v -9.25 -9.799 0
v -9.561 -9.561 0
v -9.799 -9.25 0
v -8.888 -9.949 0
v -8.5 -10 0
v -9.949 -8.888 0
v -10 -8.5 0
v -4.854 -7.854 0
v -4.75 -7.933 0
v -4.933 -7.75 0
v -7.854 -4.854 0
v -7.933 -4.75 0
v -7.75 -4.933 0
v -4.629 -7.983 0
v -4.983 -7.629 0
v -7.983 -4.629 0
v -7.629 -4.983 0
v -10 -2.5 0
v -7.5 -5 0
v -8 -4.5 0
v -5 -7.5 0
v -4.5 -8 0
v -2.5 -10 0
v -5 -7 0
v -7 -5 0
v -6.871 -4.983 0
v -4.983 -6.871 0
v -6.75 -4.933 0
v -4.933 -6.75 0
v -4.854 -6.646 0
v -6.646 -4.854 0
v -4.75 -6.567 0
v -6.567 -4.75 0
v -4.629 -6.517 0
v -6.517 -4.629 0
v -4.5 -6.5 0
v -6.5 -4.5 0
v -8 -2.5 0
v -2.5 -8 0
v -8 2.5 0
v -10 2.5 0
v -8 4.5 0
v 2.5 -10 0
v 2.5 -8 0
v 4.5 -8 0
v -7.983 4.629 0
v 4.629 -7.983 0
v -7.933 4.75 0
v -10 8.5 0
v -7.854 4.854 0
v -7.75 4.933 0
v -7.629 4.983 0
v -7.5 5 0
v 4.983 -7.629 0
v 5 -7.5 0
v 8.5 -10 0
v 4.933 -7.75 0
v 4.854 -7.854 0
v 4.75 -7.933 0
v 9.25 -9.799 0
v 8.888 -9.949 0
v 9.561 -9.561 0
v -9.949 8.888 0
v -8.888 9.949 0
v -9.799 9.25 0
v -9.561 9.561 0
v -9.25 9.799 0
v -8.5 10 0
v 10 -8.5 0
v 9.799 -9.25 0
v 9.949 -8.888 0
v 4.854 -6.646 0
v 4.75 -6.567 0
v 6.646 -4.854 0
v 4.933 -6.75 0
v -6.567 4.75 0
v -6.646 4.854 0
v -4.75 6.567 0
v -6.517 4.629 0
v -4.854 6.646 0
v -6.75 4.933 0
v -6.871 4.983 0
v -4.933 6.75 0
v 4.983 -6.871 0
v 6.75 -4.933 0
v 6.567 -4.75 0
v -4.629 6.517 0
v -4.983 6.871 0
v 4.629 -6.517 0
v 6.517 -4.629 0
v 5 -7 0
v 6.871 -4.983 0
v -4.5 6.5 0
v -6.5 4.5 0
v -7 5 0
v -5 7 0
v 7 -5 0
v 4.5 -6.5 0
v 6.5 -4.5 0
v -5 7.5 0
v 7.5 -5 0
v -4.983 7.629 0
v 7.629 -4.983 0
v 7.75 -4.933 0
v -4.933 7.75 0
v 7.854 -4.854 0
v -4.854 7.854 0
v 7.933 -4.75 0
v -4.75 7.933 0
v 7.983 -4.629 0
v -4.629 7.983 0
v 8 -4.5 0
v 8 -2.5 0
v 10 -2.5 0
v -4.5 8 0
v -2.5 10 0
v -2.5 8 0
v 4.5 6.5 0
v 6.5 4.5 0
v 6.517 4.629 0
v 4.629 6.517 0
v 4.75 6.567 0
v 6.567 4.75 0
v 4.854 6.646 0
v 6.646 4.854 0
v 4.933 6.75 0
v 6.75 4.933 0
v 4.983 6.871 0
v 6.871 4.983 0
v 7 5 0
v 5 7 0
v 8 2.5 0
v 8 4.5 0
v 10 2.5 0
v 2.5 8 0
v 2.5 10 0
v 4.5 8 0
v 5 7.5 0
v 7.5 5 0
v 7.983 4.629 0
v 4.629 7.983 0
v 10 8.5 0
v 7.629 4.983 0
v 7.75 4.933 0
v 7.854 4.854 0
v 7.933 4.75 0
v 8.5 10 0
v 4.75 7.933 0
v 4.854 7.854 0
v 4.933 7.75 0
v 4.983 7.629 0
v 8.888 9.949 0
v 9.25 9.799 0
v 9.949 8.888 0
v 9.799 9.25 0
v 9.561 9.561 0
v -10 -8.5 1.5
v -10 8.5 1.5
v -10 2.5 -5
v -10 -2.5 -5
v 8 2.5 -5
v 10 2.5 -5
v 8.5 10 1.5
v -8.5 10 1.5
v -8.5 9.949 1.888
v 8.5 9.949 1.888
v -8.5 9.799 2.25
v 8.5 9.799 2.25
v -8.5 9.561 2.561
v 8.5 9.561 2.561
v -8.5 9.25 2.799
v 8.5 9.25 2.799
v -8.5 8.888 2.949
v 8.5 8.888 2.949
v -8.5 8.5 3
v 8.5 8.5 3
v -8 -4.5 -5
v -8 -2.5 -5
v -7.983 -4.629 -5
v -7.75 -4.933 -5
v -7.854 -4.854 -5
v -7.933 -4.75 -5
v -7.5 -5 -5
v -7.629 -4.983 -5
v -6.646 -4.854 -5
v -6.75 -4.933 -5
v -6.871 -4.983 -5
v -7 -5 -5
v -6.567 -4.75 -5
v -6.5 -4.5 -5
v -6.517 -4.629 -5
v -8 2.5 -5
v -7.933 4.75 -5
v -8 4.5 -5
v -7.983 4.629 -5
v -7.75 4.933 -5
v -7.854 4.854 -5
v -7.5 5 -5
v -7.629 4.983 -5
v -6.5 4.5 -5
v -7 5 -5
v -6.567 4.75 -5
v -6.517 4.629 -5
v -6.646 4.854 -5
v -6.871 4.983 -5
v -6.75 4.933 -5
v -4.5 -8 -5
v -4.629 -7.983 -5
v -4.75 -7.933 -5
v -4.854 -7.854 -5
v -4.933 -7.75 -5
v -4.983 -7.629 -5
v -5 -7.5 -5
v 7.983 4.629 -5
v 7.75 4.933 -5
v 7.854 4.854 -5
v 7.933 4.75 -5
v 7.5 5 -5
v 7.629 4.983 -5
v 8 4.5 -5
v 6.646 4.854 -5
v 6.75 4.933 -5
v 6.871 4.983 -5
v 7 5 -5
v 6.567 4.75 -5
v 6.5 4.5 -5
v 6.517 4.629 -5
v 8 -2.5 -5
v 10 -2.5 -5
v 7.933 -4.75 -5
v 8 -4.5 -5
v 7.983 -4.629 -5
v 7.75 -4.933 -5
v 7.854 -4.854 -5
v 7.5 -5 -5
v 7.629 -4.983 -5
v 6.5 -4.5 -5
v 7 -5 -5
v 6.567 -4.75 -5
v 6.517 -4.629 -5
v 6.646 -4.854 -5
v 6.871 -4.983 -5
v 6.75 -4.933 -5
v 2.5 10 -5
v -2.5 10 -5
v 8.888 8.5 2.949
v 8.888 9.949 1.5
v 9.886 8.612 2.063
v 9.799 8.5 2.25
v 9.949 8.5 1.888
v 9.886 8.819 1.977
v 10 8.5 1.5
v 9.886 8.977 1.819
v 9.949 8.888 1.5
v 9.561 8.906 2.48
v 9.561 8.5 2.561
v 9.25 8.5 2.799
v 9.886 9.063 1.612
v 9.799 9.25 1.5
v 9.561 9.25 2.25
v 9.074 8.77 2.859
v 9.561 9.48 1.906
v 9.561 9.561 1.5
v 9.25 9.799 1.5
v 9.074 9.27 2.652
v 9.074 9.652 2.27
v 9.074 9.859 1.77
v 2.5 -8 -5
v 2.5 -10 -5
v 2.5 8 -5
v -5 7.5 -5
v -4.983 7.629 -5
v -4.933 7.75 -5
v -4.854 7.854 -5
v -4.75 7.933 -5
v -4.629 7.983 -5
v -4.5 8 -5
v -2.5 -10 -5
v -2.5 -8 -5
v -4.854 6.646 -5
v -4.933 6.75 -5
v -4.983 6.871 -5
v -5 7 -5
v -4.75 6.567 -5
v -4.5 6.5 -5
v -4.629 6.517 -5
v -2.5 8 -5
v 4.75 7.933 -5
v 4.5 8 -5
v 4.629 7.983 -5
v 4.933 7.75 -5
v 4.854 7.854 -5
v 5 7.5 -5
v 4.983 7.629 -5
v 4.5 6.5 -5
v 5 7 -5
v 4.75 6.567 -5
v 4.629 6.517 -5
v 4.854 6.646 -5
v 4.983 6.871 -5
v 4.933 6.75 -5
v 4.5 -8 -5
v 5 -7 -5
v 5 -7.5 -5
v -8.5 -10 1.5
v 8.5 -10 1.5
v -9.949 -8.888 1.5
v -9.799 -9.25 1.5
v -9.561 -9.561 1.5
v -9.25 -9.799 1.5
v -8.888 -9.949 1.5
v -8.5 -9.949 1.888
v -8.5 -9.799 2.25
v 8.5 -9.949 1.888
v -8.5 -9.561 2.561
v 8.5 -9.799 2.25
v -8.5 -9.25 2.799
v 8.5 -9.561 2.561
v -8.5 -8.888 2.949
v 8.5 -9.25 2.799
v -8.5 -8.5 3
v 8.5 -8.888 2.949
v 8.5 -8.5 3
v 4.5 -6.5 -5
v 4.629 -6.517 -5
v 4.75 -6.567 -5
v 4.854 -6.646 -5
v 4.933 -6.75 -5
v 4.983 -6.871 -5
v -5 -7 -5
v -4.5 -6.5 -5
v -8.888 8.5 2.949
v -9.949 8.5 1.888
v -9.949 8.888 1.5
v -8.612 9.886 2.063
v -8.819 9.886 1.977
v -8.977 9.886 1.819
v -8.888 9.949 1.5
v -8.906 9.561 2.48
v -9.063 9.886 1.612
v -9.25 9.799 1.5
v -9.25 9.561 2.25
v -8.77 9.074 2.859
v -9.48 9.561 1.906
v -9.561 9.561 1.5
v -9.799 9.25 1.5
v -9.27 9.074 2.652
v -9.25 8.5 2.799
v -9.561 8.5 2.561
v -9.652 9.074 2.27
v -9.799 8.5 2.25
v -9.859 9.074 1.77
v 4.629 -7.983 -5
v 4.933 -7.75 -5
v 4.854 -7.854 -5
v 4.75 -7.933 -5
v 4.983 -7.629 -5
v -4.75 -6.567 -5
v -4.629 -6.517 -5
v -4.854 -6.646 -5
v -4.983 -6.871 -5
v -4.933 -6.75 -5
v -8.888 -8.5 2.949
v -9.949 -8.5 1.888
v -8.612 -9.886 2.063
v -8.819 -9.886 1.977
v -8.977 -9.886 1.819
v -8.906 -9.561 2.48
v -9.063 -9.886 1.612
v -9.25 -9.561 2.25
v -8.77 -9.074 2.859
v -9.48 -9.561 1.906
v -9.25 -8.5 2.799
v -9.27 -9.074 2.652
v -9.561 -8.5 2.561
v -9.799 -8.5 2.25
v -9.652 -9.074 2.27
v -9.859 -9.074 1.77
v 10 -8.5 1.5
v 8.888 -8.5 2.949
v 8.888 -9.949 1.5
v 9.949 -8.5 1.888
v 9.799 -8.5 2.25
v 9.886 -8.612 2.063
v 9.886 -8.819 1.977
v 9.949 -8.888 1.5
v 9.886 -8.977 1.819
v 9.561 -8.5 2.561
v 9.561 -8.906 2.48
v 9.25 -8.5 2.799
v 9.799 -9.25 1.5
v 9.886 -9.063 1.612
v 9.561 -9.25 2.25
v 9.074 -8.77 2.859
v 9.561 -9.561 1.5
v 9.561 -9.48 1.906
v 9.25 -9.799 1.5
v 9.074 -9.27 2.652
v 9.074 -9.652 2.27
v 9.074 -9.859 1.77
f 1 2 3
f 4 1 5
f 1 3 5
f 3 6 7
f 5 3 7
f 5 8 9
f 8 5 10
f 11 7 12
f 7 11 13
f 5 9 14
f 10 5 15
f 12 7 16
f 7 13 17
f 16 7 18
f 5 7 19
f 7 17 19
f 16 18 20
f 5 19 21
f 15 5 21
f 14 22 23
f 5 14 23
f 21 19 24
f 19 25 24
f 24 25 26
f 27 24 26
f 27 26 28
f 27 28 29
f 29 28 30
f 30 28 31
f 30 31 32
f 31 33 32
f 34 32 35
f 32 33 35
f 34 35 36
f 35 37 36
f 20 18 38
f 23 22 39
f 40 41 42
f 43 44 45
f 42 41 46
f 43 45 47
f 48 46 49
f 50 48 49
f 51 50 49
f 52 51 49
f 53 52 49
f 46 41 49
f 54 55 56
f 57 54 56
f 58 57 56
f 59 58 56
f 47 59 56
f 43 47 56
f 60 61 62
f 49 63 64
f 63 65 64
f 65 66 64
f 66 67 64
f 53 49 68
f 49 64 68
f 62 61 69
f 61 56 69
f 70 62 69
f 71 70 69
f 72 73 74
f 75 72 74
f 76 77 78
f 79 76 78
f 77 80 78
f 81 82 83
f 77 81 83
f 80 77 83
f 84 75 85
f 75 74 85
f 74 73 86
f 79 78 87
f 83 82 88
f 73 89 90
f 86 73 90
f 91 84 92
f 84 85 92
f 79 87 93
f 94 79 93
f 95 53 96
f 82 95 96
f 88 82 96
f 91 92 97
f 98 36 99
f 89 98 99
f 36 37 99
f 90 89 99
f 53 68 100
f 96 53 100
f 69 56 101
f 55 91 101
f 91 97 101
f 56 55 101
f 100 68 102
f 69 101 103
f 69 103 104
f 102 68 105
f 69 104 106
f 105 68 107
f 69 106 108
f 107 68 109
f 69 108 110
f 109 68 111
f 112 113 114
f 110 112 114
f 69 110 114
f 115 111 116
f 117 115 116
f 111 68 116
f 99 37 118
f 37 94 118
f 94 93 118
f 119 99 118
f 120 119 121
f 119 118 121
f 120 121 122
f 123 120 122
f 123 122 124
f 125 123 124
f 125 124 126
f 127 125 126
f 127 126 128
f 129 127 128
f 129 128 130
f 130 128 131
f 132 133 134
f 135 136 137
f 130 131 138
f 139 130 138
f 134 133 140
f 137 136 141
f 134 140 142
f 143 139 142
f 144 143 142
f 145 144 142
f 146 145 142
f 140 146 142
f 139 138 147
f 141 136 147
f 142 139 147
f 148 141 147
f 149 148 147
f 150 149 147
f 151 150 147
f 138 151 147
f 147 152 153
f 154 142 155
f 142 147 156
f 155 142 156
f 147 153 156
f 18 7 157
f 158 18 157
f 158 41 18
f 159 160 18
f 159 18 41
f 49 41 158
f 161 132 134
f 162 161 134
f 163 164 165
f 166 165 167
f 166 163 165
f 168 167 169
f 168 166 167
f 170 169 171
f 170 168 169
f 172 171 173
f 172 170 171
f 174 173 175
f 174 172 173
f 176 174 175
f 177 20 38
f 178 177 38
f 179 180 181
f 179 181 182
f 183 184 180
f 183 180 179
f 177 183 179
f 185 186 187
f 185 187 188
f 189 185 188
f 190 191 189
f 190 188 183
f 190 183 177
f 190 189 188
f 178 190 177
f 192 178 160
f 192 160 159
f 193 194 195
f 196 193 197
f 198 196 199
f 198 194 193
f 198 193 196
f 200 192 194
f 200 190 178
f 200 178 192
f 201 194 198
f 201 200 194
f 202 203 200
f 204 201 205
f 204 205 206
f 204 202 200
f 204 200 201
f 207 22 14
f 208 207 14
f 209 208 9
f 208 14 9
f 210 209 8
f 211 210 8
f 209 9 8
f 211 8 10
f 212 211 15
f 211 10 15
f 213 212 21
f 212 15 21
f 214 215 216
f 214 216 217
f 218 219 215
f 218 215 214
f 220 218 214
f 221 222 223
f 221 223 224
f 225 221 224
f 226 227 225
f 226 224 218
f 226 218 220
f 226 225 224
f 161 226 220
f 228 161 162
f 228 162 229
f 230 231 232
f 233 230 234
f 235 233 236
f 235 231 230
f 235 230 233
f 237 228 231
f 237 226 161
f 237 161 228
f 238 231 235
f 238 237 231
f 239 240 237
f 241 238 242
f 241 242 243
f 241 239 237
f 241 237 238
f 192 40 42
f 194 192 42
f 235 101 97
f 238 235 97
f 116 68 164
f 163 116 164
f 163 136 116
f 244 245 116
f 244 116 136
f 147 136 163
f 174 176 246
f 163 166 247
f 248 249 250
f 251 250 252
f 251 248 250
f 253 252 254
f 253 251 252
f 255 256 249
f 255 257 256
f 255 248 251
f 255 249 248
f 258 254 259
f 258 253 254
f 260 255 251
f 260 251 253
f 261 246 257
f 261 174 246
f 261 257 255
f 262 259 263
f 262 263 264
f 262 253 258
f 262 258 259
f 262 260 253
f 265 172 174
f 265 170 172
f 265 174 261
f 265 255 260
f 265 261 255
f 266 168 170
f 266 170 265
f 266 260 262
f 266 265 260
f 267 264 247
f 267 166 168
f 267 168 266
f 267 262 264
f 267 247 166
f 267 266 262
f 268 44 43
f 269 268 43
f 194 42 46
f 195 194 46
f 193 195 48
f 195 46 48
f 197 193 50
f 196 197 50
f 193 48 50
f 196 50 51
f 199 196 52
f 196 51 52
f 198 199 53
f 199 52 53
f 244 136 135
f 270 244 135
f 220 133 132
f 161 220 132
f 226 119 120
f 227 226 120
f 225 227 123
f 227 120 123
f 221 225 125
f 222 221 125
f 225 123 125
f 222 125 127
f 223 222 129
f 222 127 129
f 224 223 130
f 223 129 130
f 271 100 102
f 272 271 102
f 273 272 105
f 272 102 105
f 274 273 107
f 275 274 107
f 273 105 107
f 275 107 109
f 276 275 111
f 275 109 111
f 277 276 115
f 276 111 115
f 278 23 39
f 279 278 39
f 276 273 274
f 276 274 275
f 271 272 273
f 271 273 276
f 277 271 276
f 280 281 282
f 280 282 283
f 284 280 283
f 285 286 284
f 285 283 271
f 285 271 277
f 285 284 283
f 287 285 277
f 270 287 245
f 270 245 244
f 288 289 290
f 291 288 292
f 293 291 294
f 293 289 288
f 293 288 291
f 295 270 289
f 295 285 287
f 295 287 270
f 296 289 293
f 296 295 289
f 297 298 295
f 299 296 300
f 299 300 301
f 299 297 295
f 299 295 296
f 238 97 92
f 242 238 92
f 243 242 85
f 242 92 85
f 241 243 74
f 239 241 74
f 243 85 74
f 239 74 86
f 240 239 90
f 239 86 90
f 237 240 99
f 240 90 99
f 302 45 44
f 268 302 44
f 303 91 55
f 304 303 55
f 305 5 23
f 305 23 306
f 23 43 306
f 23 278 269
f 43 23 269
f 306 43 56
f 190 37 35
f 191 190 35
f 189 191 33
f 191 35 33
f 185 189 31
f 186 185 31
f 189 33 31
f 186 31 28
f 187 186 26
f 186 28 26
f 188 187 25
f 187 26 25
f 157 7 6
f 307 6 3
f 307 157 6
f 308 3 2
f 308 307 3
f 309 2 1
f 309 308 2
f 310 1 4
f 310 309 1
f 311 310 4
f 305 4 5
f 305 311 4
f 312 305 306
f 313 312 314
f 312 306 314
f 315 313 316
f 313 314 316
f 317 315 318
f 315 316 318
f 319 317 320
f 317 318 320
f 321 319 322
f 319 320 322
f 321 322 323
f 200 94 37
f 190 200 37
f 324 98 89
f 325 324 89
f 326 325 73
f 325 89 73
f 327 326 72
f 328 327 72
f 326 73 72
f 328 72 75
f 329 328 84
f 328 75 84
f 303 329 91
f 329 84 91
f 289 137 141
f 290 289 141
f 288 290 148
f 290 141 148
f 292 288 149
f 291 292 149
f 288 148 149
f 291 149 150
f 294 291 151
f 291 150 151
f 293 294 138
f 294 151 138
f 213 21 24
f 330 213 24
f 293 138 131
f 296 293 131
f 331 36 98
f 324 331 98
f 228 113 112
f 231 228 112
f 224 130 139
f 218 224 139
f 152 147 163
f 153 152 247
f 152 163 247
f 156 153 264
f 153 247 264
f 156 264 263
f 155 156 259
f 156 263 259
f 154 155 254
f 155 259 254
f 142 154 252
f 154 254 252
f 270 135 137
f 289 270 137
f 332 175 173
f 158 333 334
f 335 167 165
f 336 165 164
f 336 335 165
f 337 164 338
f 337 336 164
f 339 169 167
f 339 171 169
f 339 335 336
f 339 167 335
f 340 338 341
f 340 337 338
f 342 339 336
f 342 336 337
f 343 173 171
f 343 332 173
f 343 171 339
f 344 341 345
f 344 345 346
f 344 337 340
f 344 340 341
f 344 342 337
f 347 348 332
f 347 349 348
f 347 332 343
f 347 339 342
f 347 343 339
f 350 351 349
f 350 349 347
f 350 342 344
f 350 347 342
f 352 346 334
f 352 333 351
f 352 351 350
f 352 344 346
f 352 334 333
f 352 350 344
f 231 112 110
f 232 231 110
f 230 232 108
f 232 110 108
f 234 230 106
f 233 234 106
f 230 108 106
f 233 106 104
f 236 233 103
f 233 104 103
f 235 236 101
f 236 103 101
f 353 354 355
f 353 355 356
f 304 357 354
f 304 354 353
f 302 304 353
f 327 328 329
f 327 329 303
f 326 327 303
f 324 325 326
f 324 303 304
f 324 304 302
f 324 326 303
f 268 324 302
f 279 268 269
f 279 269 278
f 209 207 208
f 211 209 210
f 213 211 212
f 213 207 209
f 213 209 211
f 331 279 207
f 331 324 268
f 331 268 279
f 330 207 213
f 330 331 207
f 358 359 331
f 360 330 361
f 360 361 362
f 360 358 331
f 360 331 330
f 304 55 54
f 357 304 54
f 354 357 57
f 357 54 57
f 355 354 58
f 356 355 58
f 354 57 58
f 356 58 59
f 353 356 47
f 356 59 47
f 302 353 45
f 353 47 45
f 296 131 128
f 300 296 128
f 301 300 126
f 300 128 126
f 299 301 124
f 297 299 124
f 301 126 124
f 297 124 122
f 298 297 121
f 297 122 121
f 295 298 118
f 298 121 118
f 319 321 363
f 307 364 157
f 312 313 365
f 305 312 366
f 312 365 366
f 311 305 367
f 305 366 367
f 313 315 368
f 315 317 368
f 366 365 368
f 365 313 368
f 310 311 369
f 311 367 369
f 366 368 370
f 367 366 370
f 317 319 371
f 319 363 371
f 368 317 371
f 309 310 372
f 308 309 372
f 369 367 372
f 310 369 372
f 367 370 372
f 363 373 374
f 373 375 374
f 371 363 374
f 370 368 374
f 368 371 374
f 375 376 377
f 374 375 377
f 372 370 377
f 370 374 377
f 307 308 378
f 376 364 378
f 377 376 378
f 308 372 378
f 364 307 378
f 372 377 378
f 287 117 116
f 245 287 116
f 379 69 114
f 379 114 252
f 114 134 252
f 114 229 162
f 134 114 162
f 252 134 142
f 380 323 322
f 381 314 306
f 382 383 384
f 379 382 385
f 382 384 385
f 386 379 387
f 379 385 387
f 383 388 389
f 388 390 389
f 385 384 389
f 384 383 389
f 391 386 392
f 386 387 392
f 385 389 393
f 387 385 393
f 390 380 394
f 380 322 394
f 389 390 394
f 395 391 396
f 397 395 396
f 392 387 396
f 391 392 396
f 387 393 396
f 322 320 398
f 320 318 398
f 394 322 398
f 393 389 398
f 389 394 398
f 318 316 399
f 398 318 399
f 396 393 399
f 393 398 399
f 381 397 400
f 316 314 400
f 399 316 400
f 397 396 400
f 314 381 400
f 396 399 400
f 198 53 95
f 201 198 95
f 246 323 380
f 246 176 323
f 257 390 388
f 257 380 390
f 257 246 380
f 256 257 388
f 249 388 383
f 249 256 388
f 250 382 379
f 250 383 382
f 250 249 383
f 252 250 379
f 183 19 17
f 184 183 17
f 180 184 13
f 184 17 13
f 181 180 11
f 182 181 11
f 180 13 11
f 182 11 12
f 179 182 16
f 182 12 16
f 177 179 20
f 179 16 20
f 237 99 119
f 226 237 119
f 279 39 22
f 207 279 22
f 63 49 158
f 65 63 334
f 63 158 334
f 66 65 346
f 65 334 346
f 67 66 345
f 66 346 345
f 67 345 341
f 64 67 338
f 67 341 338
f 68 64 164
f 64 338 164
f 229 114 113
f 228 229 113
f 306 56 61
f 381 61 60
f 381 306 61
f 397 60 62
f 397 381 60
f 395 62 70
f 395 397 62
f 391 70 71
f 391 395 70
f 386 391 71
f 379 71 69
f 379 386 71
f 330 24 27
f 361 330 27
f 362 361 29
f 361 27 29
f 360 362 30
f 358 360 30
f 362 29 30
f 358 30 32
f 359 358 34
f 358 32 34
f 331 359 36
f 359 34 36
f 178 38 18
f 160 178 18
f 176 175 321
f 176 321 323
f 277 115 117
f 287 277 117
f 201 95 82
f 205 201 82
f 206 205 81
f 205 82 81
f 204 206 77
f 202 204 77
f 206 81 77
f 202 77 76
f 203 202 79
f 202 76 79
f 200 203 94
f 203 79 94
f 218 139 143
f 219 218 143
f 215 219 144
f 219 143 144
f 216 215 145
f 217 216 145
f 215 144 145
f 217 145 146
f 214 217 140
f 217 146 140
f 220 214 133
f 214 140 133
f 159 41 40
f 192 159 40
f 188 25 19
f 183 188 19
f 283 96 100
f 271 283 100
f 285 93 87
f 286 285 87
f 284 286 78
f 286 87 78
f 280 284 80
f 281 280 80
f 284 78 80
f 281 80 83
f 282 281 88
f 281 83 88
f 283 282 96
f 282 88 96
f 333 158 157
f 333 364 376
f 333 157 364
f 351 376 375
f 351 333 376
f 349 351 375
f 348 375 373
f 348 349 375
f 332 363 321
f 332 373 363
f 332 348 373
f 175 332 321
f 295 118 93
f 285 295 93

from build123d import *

# Parameters (mm, degrees)
F0_W     = 20
F0_H     = 20
F1_DEPTH = 3
F3_DEPTH = 5
F5_COUNT = 4
F6_R     = 1.5


with BuildPart() as f1:
    # F0 (on Top) → F1 (new body)
    with BuildSketch(Plane.XY):
        Rectangle(F0_W, F0_H)
    extrude(amount=F1_DEPTH)

    # F2 (on face) → F3 (join)
    with BuildSketch(Plane(origin=(0, 0, 0), x_dir=(1, 0, 0), z_dir=(0, 0, -1))):
        with BuildLine():
            Line((-2.5, -8), (-2.5, -10))
            Line((-2.5, -10), (2.5, -10))
            Line((2.5, -10), (2.5, -8))
            Line((2.5, -8), (4.5, -8))
            ThreePointArc((4.5, -8), (4.8535533906, -7.8535533906), (5, -7.5))
            Line((5, -7.5), (5, -7))
            ThreePointArc((5, -7), (4.8535533906, -6.6464466094), (4.5, -6.5))
            Line((4.5, -6.5), (-4.5, -6.5))
            ThreePointArc((-4.5, -6.5), (-4.8535533906, -6.6464466094), (-5, -7))
            Line((-5, -7), (-5, -7.5))
            ThreePointArc((-5, -7.5), (-4.8535533906, -7.8535533906), (-4.5, -8))
            Line((-4.5, -8), (-2.5, -8))
        make_face()
    extrude(amount=F3_DEPTH)

    # F5: F1 ×4 about axis
    f5_axis = Axis((0, 0, -8.8594034314), (0, 0, -1))


with BuildPart() as f1_1:
    add(f1.part)
    for i in range(1, F5_COUNT):
        add(f1.part.rotate(f5_axis, i * 360 / F5_COUNT))

    # F6
    f6_edges = [f1_1.edges().sort_by_distance(p)[0] for p in [
        (-10, 0, 3),
        (0, 10, 3),
        (0, -10, 3),
        (10, 0, 3),
        (10, -10, 1.5),
        (10, 10, 1.5),
        (-10, 10, 1.5),
        (-10, -10, 1.5),
    ]]
    fillet(f6_edges, radius=F6_R)


solid = f1_1.part
